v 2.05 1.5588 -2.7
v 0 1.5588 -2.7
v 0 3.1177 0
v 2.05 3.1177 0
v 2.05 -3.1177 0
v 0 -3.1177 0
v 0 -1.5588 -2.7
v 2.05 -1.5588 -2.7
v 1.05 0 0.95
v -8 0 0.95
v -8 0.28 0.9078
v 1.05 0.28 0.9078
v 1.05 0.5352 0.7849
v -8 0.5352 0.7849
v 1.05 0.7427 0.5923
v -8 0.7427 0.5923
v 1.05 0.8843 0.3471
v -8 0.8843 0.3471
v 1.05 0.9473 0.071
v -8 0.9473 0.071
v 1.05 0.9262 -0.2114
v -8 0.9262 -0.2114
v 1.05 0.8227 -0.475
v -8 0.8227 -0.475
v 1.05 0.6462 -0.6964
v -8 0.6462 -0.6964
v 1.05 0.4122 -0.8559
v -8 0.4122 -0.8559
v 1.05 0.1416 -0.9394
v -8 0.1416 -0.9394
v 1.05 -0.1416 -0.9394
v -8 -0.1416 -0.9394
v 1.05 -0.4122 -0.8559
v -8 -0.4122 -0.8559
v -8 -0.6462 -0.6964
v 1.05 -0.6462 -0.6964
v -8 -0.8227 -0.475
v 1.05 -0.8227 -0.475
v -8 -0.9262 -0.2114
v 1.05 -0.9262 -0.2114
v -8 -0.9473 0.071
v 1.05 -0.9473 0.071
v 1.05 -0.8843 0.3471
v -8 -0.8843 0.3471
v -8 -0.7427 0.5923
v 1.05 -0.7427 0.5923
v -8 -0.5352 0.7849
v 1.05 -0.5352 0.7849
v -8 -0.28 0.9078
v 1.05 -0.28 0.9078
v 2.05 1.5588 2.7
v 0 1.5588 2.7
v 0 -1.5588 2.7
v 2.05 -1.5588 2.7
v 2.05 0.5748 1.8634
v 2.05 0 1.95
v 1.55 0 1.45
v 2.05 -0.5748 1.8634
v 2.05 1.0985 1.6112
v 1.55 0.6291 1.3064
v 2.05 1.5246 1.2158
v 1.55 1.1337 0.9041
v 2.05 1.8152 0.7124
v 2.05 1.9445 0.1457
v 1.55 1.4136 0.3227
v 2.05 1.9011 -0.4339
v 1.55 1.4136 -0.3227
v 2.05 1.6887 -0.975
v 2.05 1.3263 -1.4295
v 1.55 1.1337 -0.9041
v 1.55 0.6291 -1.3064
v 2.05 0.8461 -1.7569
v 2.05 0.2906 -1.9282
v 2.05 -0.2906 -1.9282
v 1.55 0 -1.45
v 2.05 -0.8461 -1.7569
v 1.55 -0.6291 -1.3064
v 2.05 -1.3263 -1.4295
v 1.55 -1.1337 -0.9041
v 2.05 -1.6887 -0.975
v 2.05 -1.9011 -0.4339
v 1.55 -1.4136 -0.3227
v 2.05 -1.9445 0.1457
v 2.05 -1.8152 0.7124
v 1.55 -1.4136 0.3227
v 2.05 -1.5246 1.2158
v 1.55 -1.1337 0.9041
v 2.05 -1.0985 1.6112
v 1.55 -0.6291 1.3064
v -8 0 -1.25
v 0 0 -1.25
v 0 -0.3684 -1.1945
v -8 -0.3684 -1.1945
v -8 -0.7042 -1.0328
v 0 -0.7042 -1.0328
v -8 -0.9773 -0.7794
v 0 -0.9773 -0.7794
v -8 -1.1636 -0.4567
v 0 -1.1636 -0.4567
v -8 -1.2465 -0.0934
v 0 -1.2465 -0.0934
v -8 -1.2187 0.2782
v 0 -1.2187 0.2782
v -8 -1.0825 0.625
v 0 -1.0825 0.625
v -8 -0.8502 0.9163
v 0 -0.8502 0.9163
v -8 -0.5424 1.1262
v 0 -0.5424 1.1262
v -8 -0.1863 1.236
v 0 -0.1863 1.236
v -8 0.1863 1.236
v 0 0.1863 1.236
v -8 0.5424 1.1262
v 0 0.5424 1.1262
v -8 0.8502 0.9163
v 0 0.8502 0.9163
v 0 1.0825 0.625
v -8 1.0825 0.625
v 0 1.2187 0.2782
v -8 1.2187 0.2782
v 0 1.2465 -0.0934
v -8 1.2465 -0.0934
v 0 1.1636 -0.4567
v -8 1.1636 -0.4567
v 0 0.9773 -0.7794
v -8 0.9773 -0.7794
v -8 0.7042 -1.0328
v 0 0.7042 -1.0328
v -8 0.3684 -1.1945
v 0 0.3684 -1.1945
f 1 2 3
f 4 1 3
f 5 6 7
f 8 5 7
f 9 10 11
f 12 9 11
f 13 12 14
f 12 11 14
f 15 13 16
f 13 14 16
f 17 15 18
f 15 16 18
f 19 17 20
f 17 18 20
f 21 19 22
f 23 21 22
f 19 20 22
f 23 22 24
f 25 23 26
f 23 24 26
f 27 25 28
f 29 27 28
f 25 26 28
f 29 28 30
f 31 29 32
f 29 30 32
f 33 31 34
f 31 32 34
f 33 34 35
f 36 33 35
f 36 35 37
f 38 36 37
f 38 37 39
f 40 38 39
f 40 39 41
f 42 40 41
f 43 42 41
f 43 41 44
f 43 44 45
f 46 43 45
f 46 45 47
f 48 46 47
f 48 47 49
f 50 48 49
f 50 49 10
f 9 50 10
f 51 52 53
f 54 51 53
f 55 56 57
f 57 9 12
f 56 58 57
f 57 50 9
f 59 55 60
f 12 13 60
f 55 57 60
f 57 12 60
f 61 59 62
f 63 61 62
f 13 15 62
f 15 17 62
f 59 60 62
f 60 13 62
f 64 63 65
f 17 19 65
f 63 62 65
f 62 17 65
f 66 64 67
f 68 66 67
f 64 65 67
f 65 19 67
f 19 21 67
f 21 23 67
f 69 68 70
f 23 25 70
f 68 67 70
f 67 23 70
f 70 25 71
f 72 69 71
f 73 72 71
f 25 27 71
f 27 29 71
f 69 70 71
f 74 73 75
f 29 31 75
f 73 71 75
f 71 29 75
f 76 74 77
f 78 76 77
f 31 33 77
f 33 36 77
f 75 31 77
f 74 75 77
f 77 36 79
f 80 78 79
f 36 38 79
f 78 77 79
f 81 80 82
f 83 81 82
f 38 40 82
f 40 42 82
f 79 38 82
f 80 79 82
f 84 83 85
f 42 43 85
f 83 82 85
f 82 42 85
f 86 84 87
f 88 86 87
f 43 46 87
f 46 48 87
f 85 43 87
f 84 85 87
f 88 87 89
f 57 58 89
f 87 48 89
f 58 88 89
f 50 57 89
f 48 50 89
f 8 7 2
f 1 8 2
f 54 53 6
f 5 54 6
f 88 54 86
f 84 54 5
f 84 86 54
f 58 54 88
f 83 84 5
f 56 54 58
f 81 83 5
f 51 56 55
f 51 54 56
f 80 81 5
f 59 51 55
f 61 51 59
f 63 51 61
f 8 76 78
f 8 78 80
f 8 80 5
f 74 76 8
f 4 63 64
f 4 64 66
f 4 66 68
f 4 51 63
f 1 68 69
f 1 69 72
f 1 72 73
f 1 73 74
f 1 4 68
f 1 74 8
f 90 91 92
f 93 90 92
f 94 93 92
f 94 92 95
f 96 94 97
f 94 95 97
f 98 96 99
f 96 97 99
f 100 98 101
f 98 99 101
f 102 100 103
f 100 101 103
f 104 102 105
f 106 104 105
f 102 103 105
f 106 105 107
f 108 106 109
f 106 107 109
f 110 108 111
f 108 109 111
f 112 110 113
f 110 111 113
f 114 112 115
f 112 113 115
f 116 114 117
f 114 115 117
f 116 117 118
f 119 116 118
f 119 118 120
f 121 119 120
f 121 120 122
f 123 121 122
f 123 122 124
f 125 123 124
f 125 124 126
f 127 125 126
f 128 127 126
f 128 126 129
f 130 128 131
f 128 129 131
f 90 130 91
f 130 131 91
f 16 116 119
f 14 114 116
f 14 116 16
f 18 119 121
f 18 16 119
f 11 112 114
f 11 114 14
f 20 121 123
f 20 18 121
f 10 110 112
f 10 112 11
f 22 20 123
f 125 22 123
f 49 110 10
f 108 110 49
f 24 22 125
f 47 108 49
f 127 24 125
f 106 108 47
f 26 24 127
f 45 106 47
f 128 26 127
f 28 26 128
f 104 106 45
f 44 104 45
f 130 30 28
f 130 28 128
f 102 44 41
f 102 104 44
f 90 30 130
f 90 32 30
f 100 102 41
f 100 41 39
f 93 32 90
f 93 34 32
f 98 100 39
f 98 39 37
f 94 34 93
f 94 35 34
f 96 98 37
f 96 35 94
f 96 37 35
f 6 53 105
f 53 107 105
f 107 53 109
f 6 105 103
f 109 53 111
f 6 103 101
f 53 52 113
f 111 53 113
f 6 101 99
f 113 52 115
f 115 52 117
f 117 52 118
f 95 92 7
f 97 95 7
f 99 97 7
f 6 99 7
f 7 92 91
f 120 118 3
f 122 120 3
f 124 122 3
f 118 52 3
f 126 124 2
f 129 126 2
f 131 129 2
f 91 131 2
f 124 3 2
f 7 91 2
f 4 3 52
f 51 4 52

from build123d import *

# Parameters (mm, degrees)
BOSS_EXTRUDE1_DEPTH = 2.05
SKETCH2_R           = 1.25
BOSS_EXTRUDE2_DEPTH = 8
SKETCH3_R           = 0.95
CUT_EXTRUDE1_DEPTH  = 11.863355835
CHAMFER1_SIZE       = 1


with BuildPart() as part:
    # Sketch1 → Boss-Extrude1 (new body)
    with BuildSketch(Plane(origin=(0, 0, 0), x_dir=(0, 0, -1), z_dir=(1, 0, 0))):
        Polygon((0, -3.117691454), (2.7, -1.558845727), (2.7, 1.558845727), (0, 3.117691454), (-2.7, 1.558845727), (-2.7, -1.558845727), align=None)
    extrude(amount=BOSS_EXTRUDE1_DEPTH)

    # Sketch2 → Boss-Extrude2 (add)
    with BuildSketch(Plane.ZY):
        with Locations(Location((0, 0, 0), (0, 0, 180))):
            Circle(SKETCH2_R)
    extrude(amount=BOSS_EXTRUDE2_DEPTH)

    # Sketch3 → Cut-Extrude1 (cut, through all)
    with BuildSketch(Plane.ZY.offset(8)):
        Circle(SKETCH3_R)
    extrude(amount=-CUT_EXTRUDE1_DEPTH, mode=Mode.SUBTRACT)

    # Chamfer1
    chamfer1_edges = [part.edges().sort_by_distance(p)[0] for p in [
        (2.05, 0, -0.95),
    ]]
    chamfer(chamfer1_edges, length=CHAMFER1_SIZE)


solid = part.part
